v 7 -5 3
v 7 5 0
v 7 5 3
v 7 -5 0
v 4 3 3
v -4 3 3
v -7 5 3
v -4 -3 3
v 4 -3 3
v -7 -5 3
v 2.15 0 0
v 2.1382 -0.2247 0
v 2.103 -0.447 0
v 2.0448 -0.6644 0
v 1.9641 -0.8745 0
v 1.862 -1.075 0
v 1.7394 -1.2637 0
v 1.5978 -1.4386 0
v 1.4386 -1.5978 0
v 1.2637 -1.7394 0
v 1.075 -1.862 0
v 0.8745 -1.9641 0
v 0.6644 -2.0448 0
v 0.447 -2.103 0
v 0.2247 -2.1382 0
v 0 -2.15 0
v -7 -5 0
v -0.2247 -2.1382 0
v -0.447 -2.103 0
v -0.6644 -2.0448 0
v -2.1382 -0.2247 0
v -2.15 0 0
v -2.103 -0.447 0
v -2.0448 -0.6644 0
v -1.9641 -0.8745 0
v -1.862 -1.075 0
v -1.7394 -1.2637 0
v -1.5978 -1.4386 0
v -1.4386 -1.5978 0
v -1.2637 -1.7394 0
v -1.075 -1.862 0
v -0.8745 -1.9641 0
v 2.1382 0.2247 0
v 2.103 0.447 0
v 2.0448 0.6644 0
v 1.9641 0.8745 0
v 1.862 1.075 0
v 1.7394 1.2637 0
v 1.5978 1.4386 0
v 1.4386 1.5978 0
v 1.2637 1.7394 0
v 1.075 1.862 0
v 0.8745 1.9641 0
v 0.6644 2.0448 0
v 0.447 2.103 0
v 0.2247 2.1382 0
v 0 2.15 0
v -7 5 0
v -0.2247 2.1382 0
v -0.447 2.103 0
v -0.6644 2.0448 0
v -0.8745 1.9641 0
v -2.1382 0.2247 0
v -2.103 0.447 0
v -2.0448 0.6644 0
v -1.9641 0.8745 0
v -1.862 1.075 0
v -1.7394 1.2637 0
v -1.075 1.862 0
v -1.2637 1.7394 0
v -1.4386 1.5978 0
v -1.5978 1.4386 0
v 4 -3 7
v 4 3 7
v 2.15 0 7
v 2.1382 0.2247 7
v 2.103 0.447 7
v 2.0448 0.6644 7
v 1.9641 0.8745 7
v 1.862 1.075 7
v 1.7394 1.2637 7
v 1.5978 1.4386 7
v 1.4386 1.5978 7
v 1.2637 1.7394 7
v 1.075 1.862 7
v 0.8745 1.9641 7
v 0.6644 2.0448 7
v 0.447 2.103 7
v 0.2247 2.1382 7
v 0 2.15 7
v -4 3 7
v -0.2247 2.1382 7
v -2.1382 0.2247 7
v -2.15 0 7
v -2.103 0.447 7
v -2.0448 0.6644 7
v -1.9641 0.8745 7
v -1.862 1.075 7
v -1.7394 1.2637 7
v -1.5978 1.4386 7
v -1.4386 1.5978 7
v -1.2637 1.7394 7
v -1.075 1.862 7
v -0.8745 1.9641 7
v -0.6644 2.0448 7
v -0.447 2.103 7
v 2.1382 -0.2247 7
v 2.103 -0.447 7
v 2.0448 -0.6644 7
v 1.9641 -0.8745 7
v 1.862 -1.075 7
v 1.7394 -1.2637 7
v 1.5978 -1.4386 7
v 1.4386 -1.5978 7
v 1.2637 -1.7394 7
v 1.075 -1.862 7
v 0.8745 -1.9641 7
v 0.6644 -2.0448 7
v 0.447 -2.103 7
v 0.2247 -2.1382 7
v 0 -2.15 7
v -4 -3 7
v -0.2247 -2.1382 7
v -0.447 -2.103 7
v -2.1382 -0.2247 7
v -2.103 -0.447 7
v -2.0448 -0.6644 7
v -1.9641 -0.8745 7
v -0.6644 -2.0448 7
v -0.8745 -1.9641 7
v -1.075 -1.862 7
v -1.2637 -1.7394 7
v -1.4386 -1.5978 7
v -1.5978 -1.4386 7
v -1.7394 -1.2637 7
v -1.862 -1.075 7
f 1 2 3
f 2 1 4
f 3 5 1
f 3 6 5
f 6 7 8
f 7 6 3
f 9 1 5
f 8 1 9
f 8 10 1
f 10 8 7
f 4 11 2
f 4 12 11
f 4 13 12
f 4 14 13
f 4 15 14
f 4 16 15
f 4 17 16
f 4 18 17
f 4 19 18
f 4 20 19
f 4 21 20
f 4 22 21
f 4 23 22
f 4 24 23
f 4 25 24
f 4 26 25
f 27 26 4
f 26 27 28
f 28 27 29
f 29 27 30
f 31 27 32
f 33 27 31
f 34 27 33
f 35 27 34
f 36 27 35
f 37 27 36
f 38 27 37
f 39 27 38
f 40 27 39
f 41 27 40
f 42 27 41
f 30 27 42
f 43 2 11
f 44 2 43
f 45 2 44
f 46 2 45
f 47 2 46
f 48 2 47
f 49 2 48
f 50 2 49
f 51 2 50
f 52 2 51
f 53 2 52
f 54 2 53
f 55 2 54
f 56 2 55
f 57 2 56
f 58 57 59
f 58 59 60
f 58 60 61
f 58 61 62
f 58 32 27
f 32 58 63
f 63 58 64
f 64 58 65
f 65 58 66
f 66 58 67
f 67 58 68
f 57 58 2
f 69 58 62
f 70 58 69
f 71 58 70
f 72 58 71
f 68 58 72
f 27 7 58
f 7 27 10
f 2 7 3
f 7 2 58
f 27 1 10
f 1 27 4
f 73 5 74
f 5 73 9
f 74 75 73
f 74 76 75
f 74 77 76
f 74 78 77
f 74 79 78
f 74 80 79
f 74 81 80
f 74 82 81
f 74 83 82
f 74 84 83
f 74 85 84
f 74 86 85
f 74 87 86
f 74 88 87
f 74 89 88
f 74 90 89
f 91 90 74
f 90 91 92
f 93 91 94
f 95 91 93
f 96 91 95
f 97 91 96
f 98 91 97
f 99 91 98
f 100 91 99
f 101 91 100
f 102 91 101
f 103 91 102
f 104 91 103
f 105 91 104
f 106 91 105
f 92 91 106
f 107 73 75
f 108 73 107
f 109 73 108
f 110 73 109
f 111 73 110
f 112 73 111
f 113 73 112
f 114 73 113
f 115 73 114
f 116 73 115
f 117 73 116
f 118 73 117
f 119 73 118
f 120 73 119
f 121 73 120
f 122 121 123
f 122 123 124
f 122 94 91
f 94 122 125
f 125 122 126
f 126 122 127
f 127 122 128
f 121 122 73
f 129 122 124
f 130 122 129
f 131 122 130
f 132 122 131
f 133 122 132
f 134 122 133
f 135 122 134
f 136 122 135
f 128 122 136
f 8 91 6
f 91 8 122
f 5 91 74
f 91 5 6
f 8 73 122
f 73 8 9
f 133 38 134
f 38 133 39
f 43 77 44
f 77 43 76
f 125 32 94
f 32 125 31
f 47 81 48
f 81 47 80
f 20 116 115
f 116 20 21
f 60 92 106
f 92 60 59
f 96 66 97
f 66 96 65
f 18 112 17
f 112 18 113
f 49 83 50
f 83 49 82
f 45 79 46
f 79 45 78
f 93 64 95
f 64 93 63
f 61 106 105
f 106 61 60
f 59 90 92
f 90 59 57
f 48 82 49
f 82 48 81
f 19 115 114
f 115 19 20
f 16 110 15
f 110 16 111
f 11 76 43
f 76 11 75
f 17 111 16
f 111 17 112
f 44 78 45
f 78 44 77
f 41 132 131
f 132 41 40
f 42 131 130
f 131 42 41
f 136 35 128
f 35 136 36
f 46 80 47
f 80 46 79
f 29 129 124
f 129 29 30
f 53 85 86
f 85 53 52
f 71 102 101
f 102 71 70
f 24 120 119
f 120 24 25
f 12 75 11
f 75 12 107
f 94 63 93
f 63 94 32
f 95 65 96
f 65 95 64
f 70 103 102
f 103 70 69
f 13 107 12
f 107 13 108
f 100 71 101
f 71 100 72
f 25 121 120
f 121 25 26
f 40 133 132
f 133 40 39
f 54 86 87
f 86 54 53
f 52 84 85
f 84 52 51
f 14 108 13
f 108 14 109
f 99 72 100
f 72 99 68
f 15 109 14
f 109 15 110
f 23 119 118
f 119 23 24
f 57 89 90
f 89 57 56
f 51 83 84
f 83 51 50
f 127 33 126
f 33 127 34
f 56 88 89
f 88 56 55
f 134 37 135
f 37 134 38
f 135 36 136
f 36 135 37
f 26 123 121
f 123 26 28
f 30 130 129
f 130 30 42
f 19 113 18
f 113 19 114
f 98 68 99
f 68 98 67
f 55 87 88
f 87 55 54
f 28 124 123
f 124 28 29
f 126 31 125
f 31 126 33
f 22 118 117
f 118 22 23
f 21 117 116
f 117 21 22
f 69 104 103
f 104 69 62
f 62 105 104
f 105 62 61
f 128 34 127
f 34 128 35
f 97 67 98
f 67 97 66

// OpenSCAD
// T-slot nut for aluminium extrusion.
$fn = 60;
eps = 0.02;
slot_w = 6;
thread_d = 4.3;
length = 14;
body_w = slot_w + 4;
body_h = 7;
difference() {
    union() {
        translate([-length / 2, -body_w / 2, 0]) cube([length, body_w, 3]);
        translate([-length / 2 + 3, -slot_w / 2, 3]) cube([length - 6, slot_w, body_h - 3]);
    }
    translate([0, 0, -eps]) cylinder(d = thread_d, h = body_h + 2 * eps);
}
